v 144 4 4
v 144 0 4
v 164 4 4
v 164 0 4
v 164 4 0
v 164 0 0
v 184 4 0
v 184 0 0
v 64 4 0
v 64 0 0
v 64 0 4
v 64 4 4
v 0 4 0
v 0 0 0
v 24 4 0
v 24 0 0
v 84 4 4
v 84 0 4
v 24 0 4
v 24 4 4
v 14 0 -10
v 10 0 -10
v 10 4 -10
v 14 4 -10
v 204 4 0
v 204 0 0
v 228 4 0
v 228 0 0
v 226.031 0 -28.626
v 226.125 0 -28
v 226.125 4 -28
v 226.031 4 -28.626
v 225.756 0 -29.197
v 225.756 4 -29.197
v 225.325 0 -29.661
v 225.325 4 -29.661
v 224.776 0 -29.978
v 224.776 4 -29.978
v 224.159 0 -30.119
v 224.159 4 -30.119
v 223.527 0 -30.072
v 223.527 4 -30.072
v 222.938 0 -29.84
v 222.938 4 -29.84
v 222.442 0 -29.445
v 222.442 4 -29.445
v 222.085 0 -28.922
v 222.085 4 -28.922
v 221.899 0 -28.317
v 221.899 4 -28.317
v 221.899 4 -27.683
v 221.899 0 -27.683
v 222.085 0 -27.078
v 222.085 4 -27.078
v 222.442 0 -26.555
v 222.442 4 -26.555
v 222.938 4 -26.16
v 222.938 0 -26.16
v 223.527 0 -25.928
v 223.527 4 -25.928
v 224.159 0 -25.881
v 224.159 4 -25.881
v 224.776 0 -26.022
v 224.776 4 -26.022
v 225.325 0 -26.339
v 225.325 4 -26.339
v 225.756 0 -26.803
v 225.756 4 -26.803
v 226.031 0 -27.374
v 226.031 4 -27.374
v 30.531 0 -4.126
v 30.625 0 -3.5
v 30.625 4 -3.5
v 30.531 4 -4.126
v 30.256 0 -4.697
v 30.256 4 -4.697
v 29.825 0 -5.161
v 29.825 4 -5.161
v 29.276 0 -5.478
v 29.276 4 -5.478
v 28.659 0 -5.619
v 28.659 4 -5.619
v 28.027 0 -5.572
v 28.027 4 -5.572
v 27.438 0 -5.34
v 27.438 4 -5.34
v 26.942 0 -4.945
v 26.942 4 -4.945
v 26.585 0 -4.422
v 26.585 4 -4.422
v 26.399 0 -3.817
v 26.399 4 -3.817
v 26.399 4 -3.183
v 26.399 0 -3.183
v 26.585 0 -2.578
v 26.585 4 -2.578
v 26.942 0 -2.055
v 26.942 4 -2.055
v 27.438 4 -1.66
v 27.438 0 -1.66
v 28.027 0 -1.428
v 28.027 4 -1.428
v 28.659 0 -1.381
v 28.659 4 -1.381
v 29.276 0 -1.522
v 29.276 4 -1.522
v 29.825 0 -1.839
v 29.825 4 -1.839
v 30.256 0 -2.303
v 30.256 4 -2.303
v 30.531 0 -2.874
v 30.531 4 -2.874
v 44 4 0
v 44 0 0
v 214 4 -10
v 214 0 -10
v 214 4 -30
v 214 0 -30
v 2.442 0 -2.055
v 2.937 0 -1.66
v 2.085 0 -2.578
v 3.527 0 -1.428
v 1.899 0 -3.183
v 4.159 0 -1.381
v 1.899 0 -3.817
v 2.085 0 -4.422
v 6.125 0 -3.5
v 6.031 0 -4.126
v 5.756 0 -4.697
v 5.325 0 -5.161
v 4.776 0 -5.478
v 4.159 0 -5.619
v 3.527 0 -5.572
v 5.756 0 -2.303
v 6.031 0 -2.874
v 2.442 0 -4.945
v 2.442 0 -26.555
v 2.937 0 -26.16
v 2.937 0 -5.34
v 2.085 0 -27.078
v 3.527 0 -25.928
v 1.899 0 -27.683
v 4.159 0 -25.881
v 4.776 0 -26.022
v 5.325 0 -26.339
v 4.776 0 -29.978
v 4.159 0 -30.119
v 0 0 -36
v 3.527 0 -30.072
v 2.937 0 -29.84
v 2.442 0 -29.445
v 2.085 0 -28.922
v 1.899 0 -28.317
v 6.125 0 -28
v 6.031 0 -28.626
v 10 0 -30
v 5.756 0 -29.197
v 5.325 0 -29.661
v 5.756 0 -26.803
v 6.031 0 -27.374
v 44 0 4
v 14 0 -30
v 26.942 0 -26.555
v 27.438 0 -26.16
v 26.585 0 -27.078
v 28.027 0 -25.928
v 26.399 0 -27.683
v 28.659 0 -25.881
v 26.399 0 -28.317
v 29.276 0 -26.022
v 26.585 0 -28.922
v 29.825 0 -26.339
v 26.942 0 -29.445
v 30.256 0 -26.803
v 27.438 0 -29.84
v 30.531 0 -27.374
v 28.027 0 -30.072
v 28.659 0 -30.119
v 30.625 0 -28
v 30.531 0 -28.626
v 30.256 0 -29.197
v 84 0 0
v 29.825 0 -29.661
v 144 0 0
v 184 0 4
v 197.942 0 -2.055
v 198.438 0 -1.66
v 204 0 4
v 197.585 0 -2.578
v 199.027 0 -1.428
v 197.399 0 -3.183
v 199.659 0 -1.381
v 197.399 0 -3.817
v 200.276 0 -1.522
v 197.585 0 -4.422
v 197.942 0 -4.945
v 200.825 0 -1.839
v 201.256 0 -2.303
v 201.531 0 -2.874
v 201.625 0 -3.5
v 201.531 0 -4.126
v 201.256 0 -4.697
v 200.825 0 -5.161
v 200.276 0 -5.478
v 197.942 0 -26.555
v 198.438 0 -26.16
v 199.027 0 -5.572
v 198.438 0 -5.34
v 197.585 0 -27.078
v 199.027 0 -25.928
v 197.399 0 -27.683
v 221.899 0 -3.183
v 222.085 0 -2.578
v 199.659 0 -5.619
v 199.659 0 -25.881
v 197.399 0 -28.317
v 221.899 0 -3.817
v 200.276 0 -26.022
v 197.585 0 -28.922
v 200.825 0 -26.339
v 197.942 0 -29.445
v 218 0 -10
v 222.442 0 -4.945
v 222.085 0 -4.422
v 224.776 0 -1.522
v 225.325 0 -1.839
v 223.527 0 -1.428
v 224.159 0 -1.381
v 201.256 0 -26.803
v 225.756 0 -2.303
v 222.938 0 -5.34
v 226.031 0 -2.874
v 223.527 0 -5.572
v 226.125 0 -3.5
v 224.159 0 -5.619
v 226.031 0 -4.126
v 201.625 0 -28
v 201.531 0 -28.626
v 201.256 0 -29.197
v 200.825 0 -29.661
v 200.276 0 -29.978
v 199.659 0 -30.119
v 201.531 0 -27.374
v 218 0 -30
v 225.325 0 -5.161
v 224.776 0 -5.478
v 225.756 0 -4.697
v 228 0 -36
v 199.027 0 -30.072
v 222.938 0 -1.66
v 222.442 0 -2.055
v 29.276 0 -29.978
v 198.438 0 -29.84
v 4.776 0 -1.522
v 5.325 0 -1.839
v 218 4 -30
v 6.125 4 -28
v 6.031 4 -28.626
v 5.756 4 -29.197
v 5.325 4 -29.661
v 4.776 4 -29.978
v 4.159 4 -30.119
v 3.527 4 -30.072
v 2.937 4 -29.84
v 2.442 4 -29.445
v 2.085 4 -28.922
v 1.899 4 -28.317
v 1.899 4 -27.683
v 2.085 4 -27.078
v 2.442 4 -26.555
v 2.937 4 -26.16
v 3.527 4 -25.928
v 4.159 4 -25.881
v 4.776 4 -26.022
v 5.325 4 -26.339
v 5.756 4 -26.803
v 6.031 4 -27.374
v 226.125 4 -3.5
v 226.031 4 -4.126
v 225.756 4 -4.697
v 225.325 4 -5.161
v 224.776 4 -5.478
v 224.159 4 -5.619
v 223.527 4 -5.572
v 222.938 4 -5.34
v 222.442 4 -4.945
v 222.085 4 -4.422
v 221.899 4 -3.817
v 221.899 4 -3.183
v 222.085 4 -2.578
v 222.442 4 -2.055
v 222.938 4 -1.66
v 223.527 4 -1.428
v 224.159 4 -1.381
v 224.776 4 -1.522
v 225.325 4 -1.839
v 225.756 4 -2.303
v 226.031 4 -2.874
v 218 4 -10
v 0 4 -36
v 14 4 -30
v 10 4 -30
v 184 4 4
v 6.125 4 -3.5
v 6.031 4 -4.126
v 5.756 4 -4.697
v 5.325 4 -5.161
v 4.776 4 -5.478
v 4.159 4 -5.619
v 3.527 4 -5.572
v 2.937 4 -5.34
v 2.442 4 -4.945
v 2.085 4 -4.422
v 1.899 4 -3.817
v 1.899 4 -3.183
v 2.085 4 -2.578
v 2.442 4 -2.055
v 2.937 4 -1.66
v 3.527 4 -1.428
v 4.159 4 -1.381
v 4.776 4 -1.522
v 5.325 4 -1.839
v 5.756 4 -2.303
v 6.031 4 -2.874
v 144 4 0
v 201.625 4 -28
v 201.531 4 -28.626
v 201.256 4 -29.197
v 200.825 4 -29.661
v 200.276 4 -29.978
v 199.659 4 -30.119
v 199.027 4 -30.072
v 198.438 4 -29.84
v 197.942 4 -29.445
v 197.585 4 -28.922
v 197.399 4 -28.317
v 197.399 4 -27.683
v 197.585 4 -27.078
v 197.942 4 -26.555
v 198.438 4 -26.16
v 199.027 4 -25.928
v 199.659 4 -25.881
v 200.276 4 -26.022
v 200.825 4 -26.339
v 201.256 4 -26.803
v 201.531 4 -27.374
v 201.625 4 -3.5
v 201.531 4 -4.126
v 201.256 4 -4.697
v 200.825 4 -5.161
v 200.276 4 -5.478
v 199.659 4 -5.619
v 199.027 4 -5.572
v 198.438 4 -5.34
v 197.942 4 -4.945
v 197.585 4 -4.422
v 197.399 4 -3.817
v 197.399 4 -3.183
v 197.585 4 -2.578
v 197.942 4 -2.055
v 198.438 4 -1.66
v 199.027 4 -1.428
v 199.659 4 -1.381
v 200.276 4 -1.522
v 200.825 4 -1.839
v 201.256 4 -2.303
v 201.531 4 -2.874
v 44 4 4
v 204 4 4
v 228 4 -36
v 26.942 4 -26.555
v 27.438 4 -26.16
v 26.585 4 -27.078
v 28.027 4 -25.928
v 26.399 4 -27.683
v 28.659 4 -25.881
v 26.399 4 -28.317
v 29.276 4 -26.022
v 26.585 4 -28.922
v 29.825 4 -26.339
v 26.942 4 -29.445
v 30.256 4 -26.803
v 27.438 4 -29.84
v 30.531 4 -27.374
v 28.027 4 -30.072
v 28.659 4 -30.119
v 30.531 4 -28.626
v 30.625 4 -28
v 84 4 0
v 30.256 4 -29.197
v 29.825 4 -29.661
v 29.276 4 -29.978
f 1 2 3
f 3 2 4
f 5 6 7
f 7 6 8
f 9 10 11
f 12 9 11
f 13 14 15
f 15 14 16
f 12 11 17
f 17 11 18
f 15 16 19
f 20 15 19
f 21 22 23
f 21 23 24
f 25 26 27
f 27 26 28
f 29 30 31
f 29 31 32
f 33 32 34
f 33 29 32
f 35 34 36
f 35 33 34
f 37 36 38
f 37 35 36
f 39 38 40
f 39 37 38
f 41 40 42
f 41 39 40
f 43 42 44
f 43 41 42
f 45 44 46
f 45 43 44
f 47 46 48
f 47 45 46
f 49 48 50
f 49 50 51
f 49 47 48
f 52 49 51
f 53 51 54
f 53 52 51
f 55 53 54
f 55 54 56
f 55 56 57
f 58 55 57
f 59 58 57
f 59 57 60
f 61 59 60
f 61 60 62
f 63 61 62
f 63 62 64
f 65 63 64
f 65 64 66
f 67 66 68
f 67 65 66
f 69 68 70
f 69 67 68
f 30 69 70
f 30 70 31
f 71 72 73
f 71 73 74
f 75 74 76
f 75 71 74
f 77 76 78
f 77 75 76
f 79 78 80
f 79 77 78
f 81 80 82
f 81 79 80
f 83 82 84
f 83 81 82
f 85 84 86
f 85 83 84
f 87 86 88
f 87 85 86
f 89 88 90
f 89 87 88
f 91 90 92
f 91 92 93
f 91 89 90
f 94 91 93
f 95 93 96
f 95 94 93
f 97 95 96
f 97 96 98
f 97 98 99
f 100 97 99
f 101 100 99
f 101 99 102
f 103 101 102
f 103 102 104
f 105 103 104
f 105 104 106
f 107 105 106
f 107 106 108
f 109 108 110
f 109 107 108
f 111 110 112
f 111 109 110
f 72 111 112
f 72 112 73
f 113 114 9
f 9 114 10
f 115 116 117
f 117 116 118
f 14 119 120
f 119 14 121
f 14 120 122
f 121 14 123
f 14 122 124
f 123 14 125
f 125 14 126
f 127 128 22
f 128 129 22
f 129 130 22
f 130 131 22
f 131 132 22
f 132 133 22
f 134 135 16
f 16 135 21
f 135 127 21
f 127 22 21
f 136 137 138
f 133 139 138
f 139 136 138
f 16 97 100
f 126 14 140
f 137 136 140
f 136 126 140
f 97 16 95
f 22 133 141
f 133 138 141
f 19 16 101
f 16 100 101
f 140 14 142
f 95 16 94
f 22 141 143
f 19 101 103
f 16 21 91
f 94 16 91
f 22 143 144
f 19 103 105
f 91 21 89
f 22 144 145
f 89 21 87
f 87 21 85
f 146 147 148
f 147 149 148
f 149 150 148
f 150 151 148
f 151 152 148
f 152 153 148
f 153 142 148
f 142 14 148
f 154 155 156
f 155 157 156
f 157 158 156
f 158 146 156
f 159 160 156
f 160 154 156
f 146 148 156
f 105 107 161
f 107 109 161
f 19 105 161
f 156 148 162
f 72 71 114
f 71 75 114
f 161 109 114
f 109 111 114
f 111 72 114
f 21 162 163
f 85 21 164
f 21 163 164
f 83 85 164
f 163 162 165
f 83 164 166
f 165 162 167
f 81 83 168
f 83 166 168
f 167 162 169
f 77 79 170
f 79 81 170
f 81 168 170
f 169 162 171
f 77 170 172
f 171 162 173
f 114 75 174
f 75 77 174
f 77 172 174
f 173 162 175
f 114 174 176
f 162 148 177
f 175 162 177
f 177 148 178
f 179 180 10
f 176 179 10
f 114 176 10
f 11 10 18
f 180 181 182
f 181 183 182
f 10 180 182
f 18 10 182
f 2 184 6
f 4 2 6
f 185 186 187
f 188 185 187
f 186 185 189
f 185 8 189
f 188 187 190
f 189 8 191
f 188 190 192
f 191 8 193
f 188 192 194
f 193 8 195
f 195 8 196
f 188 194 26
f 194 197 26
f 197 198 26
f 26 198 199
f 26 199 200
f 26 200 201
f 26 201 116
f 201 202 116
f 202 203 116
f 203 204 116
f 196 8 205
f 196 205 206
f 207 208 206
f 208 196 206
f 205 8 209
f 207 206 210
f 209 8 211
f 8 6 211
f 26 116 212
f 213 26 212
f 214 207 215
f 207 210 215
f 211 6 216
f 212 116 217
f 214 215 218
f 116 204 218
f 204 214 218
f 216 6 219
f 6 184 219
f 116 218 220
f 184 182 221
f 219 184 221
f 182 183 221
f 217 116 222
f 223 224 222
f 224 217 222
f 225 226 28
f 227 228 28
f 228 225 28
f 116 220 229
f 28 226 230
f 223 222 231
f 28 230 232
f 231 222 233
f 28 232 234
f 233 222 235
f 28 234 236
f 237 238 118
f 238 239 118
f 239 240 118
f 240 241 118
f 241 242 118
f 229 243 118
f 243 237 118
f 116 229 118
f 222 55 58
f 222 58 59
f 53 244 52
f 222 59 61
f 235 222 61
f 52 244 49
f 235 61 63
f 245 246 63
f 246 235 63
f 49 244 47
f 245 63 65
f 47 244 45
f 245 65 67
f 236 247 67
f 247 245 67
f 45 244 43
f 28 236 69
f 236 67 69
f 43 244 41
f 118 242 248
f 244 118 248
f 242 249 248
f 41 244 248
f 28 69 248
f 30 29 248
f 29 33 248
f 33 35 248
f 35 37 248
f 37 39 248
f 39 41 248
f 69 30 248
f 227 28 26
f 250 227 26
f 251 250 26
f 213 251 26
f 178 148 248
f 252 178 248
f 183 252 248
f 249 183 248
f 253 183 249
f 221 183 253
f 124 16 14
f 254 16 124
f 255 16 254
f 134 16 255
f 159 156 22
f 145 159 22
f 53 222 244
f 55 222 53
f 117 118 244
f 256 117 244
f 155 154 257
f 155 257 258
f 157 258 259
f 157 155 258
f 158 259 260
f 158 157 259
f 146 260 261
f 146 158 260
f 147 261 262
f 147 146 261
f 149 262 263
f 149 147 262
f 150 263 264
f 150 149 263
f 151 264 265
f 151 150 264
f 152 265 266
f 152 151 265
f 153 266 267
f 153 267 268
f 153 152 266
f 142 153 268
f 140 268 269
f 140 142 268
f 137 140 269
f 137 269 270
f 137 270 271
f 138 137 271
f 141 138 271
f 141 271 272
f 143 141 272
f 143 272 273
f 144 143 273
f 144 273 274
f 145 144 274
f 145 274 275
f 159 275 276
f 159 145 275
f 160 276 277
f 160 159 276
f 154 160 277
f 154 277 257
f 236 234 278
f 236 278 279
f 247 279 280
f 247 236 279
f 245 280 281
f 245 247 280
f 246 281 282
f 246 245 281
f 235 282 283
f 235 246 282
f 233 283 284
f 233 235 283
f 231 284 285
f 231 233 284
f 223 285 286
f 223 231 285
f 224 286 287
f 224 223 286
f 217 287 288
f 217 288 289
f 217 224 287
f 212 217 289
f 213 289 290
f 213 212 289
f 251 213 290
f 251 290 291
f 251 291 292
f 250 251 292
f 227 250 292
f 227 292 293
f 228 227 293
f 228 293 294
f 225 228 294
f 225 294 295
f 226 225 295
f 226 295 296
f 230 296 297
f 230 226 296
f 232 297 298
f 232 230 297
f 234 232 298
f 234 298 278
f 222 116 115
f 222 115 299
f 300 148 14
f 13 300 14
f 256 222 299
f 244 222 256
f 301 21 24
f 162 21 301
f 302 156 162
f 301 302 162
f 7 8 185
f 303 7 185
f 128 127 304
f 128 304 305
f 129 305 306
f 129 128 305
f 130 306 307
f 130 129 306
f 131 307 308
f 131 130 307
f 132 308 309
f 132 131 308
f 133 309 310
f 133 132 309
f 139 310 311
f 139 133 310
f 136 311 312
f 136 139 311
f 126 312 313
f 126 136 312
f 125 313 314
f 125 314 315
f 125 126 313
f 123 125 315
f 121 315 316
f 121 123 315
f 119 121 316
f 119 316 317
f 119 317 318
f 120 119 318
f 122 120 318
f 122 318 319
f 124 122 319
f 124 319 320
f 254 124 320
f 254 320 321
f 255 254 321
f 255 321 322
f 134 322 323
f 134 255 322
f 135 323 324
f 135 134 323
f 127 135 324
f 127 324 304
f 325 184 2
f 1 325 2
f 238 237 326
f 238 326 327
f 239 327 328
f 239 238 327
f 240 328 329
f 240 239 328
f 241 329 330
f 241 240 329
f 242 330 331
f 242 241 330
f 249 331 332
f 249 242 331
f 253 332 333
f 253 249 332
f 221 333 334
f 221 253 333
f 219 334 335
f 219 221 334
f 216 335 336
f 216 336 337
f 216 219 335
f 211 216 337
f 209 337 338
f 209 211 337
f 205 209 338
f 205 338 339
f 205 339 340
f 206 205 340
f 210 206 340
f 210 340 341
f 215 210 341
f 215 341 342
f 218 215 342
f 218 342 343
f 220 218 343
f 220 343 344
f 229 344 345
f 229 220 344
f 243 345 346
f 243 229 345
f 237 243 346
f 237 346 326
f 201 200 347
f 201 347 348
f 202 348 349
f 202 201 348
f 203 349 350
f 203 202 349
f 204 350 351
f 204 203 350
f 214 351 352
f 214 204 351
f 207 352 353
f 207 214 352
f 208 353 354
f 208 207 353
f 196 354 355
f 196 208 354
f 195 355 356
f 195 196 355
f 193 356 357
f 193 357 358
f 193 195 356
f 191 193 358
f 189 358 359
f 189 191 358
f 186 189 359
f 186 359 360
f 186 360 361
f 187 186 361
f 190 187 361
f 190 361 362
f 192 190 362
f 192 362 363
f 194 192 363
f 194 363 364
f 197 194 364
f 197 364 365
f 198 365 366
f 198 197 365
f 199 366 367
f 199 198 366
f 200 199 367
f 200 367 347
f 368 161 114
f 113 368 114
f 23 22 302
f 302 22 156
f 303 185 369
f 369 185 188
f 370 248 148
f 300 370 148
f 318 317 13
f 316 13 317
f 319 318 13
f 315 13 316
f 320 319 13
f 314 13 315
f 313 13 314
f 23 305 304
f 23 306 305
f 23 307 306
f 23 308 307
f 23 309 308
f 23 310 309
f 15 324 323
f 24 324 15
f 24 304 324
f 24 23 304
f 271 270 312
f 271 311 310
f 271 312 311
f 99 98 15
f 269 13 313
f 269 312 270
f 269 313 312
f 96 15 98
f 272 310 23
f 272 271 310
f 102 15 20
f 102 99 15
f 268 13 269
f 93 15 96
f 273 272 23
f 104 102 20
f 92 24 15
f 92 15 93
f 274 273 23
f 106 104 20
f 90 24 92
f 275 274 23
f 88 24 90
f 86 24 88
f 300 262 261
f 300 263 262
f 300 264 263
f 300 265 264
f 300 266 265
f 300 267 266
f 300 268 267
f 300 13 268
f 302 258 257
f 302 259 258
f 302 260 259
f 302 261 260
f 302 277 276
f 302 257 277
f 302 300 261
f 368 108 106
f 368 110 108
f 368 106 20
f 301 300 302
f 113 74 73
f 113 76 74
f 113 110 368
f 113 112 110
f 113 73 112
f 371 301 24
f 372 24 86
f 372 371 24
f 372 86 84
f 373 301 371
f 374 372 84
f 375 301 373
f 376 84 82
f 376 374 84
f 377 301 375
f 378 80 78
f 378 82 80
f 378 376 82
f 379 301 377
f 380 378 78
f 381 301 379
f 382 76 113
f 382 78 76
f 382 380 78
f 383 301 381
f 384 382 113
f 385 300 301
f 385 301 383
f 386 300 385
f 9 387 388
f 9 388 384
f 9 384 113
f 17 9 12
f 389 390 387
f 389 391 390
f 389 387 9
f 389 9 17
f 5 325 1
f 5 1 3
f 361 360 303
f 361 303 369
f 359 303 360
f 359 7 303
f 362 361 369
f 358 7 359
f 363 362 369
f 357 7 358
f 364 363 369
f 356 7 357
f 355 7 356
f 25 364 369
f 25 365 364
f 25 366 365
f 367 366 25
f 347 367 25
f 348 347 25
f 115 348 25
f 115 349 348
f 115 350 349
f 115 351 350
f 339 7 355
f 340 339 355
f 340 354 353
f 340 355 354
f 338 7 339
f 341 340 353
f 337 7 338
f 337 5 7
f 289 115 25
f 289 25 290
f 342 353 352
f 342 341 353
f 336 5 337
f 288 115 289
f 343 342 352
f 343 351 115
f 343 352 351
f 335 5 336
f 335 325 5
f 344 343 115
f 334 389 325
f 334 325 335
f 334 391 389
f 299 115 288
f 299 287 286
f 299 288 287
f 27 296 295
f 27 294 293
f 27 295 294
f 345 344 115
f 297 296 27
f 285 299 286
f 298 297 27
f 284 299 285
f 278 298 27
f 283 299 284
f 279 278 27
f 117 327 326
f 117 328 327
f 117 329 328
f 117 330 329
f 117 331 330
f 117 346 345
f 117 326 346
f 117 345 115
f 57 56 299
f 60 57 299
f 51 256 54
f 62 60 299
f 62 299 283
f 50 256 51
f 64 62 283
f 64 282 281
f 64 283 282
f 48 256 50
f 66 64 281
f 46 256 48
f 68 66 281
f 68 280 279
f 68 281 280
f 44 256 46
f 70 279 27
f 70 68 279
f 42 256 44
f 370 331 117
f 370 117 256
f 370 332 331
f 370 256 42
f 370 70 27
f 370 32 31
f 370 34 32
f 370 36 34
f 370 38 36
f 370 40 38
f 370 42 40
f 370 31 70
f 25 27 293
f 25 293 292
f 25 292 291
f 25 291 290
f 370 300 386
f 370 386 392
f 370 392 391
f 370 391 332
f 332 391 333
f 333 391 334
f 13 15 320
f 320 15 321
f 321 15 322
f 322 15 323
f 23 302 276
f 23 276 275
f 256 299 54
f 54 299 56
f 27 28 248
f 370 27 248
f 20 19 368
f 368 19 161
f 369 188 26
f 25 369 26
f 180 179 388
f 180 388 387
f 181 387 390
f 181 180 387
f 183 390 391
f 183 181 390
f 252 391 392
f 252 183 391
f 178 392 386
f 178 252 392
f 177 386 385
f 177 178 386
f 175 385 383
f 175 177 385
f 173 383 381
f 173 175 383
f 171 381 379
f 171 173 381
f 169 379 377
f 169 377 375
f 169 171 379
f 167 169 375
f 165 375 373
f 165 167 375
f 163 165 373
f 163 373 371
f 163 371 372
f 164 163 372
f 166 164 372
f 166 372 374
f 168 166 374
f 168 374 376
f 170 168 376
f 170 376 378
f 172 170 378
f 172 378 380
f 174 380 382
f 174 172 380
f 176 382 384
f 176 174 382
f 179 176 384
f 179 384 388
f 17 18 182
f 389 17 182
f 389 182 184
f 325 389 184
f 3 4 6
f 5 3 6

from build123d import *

# Parameters (mm, degrees)
SKETCH1_R           = 2.125
SKETCH1_W           = 4
SKETCH1_H           = 20
BOSS_EXTRUDE2_DEPTH = 4


with BuildPart() as part:
    # Sketch1 → Boss-Extrude2 (new body)
    with BuildSketch(Plane(origin=(0, 0, 0), x_dir=(1, 0, 0), z_dir=(0, 1, 0))):
        Polygon((64, 0), (64, -4), (84, -4), (84, 0), (144, 0), (144, -4), (164, -4), (164, 0), (184, 0), (184, -4), (204, -4), (204, 0), (228, 0), (228, 36), (0, 36), (0, 0), (24, 0), (24, -4), (44, -4), (44, 0), align=None)
        with Locations((4, 3.5)):
            Circle(SKETCH1_R, mode=Mode.SUBTRACT)
        with Locations((28.5, 3.5)):
            Circle(SKETCH1_R, mode=Mode.SUBTRACT)
        with Locations((199.5, 3.5)):
            Circle(SKETCH1_R, mode=Mode.SUBTRACT)
        with Locations((224, 3.5)):
            Circle(SKETCH1_R, mode=Mode.SUBTRACT)
        with Locations((12, 20)):
            Rectangle(SKETCH1_W, SKETCH1_H, mode=Mode.SUBTRACT)
        with Locations((4, 28)):
            Circle(SKETCH1_R, mode=Mode.SUBTRACT)
        with Locations((28.5, 28)):
            Circle(SKETCH1_R, mode=Mode.SUBTRACT)
        with Locations((216, 20)):
            Rectangle(SKETCH1_W, SKETCH1_H, mode=Mode.SUBTRACT)
        with Locations((199.5, 28)):
            Circle(SKETCH1_R, mode=Mode.SUBTRACT)
        with Locations((224, 28)):
            Circle(SKETCH1_R, mode=Mode.SUBTRACT)
    extrude(amount=BOSS_EXTRUDE2_DEPTH)


solid = part.part
